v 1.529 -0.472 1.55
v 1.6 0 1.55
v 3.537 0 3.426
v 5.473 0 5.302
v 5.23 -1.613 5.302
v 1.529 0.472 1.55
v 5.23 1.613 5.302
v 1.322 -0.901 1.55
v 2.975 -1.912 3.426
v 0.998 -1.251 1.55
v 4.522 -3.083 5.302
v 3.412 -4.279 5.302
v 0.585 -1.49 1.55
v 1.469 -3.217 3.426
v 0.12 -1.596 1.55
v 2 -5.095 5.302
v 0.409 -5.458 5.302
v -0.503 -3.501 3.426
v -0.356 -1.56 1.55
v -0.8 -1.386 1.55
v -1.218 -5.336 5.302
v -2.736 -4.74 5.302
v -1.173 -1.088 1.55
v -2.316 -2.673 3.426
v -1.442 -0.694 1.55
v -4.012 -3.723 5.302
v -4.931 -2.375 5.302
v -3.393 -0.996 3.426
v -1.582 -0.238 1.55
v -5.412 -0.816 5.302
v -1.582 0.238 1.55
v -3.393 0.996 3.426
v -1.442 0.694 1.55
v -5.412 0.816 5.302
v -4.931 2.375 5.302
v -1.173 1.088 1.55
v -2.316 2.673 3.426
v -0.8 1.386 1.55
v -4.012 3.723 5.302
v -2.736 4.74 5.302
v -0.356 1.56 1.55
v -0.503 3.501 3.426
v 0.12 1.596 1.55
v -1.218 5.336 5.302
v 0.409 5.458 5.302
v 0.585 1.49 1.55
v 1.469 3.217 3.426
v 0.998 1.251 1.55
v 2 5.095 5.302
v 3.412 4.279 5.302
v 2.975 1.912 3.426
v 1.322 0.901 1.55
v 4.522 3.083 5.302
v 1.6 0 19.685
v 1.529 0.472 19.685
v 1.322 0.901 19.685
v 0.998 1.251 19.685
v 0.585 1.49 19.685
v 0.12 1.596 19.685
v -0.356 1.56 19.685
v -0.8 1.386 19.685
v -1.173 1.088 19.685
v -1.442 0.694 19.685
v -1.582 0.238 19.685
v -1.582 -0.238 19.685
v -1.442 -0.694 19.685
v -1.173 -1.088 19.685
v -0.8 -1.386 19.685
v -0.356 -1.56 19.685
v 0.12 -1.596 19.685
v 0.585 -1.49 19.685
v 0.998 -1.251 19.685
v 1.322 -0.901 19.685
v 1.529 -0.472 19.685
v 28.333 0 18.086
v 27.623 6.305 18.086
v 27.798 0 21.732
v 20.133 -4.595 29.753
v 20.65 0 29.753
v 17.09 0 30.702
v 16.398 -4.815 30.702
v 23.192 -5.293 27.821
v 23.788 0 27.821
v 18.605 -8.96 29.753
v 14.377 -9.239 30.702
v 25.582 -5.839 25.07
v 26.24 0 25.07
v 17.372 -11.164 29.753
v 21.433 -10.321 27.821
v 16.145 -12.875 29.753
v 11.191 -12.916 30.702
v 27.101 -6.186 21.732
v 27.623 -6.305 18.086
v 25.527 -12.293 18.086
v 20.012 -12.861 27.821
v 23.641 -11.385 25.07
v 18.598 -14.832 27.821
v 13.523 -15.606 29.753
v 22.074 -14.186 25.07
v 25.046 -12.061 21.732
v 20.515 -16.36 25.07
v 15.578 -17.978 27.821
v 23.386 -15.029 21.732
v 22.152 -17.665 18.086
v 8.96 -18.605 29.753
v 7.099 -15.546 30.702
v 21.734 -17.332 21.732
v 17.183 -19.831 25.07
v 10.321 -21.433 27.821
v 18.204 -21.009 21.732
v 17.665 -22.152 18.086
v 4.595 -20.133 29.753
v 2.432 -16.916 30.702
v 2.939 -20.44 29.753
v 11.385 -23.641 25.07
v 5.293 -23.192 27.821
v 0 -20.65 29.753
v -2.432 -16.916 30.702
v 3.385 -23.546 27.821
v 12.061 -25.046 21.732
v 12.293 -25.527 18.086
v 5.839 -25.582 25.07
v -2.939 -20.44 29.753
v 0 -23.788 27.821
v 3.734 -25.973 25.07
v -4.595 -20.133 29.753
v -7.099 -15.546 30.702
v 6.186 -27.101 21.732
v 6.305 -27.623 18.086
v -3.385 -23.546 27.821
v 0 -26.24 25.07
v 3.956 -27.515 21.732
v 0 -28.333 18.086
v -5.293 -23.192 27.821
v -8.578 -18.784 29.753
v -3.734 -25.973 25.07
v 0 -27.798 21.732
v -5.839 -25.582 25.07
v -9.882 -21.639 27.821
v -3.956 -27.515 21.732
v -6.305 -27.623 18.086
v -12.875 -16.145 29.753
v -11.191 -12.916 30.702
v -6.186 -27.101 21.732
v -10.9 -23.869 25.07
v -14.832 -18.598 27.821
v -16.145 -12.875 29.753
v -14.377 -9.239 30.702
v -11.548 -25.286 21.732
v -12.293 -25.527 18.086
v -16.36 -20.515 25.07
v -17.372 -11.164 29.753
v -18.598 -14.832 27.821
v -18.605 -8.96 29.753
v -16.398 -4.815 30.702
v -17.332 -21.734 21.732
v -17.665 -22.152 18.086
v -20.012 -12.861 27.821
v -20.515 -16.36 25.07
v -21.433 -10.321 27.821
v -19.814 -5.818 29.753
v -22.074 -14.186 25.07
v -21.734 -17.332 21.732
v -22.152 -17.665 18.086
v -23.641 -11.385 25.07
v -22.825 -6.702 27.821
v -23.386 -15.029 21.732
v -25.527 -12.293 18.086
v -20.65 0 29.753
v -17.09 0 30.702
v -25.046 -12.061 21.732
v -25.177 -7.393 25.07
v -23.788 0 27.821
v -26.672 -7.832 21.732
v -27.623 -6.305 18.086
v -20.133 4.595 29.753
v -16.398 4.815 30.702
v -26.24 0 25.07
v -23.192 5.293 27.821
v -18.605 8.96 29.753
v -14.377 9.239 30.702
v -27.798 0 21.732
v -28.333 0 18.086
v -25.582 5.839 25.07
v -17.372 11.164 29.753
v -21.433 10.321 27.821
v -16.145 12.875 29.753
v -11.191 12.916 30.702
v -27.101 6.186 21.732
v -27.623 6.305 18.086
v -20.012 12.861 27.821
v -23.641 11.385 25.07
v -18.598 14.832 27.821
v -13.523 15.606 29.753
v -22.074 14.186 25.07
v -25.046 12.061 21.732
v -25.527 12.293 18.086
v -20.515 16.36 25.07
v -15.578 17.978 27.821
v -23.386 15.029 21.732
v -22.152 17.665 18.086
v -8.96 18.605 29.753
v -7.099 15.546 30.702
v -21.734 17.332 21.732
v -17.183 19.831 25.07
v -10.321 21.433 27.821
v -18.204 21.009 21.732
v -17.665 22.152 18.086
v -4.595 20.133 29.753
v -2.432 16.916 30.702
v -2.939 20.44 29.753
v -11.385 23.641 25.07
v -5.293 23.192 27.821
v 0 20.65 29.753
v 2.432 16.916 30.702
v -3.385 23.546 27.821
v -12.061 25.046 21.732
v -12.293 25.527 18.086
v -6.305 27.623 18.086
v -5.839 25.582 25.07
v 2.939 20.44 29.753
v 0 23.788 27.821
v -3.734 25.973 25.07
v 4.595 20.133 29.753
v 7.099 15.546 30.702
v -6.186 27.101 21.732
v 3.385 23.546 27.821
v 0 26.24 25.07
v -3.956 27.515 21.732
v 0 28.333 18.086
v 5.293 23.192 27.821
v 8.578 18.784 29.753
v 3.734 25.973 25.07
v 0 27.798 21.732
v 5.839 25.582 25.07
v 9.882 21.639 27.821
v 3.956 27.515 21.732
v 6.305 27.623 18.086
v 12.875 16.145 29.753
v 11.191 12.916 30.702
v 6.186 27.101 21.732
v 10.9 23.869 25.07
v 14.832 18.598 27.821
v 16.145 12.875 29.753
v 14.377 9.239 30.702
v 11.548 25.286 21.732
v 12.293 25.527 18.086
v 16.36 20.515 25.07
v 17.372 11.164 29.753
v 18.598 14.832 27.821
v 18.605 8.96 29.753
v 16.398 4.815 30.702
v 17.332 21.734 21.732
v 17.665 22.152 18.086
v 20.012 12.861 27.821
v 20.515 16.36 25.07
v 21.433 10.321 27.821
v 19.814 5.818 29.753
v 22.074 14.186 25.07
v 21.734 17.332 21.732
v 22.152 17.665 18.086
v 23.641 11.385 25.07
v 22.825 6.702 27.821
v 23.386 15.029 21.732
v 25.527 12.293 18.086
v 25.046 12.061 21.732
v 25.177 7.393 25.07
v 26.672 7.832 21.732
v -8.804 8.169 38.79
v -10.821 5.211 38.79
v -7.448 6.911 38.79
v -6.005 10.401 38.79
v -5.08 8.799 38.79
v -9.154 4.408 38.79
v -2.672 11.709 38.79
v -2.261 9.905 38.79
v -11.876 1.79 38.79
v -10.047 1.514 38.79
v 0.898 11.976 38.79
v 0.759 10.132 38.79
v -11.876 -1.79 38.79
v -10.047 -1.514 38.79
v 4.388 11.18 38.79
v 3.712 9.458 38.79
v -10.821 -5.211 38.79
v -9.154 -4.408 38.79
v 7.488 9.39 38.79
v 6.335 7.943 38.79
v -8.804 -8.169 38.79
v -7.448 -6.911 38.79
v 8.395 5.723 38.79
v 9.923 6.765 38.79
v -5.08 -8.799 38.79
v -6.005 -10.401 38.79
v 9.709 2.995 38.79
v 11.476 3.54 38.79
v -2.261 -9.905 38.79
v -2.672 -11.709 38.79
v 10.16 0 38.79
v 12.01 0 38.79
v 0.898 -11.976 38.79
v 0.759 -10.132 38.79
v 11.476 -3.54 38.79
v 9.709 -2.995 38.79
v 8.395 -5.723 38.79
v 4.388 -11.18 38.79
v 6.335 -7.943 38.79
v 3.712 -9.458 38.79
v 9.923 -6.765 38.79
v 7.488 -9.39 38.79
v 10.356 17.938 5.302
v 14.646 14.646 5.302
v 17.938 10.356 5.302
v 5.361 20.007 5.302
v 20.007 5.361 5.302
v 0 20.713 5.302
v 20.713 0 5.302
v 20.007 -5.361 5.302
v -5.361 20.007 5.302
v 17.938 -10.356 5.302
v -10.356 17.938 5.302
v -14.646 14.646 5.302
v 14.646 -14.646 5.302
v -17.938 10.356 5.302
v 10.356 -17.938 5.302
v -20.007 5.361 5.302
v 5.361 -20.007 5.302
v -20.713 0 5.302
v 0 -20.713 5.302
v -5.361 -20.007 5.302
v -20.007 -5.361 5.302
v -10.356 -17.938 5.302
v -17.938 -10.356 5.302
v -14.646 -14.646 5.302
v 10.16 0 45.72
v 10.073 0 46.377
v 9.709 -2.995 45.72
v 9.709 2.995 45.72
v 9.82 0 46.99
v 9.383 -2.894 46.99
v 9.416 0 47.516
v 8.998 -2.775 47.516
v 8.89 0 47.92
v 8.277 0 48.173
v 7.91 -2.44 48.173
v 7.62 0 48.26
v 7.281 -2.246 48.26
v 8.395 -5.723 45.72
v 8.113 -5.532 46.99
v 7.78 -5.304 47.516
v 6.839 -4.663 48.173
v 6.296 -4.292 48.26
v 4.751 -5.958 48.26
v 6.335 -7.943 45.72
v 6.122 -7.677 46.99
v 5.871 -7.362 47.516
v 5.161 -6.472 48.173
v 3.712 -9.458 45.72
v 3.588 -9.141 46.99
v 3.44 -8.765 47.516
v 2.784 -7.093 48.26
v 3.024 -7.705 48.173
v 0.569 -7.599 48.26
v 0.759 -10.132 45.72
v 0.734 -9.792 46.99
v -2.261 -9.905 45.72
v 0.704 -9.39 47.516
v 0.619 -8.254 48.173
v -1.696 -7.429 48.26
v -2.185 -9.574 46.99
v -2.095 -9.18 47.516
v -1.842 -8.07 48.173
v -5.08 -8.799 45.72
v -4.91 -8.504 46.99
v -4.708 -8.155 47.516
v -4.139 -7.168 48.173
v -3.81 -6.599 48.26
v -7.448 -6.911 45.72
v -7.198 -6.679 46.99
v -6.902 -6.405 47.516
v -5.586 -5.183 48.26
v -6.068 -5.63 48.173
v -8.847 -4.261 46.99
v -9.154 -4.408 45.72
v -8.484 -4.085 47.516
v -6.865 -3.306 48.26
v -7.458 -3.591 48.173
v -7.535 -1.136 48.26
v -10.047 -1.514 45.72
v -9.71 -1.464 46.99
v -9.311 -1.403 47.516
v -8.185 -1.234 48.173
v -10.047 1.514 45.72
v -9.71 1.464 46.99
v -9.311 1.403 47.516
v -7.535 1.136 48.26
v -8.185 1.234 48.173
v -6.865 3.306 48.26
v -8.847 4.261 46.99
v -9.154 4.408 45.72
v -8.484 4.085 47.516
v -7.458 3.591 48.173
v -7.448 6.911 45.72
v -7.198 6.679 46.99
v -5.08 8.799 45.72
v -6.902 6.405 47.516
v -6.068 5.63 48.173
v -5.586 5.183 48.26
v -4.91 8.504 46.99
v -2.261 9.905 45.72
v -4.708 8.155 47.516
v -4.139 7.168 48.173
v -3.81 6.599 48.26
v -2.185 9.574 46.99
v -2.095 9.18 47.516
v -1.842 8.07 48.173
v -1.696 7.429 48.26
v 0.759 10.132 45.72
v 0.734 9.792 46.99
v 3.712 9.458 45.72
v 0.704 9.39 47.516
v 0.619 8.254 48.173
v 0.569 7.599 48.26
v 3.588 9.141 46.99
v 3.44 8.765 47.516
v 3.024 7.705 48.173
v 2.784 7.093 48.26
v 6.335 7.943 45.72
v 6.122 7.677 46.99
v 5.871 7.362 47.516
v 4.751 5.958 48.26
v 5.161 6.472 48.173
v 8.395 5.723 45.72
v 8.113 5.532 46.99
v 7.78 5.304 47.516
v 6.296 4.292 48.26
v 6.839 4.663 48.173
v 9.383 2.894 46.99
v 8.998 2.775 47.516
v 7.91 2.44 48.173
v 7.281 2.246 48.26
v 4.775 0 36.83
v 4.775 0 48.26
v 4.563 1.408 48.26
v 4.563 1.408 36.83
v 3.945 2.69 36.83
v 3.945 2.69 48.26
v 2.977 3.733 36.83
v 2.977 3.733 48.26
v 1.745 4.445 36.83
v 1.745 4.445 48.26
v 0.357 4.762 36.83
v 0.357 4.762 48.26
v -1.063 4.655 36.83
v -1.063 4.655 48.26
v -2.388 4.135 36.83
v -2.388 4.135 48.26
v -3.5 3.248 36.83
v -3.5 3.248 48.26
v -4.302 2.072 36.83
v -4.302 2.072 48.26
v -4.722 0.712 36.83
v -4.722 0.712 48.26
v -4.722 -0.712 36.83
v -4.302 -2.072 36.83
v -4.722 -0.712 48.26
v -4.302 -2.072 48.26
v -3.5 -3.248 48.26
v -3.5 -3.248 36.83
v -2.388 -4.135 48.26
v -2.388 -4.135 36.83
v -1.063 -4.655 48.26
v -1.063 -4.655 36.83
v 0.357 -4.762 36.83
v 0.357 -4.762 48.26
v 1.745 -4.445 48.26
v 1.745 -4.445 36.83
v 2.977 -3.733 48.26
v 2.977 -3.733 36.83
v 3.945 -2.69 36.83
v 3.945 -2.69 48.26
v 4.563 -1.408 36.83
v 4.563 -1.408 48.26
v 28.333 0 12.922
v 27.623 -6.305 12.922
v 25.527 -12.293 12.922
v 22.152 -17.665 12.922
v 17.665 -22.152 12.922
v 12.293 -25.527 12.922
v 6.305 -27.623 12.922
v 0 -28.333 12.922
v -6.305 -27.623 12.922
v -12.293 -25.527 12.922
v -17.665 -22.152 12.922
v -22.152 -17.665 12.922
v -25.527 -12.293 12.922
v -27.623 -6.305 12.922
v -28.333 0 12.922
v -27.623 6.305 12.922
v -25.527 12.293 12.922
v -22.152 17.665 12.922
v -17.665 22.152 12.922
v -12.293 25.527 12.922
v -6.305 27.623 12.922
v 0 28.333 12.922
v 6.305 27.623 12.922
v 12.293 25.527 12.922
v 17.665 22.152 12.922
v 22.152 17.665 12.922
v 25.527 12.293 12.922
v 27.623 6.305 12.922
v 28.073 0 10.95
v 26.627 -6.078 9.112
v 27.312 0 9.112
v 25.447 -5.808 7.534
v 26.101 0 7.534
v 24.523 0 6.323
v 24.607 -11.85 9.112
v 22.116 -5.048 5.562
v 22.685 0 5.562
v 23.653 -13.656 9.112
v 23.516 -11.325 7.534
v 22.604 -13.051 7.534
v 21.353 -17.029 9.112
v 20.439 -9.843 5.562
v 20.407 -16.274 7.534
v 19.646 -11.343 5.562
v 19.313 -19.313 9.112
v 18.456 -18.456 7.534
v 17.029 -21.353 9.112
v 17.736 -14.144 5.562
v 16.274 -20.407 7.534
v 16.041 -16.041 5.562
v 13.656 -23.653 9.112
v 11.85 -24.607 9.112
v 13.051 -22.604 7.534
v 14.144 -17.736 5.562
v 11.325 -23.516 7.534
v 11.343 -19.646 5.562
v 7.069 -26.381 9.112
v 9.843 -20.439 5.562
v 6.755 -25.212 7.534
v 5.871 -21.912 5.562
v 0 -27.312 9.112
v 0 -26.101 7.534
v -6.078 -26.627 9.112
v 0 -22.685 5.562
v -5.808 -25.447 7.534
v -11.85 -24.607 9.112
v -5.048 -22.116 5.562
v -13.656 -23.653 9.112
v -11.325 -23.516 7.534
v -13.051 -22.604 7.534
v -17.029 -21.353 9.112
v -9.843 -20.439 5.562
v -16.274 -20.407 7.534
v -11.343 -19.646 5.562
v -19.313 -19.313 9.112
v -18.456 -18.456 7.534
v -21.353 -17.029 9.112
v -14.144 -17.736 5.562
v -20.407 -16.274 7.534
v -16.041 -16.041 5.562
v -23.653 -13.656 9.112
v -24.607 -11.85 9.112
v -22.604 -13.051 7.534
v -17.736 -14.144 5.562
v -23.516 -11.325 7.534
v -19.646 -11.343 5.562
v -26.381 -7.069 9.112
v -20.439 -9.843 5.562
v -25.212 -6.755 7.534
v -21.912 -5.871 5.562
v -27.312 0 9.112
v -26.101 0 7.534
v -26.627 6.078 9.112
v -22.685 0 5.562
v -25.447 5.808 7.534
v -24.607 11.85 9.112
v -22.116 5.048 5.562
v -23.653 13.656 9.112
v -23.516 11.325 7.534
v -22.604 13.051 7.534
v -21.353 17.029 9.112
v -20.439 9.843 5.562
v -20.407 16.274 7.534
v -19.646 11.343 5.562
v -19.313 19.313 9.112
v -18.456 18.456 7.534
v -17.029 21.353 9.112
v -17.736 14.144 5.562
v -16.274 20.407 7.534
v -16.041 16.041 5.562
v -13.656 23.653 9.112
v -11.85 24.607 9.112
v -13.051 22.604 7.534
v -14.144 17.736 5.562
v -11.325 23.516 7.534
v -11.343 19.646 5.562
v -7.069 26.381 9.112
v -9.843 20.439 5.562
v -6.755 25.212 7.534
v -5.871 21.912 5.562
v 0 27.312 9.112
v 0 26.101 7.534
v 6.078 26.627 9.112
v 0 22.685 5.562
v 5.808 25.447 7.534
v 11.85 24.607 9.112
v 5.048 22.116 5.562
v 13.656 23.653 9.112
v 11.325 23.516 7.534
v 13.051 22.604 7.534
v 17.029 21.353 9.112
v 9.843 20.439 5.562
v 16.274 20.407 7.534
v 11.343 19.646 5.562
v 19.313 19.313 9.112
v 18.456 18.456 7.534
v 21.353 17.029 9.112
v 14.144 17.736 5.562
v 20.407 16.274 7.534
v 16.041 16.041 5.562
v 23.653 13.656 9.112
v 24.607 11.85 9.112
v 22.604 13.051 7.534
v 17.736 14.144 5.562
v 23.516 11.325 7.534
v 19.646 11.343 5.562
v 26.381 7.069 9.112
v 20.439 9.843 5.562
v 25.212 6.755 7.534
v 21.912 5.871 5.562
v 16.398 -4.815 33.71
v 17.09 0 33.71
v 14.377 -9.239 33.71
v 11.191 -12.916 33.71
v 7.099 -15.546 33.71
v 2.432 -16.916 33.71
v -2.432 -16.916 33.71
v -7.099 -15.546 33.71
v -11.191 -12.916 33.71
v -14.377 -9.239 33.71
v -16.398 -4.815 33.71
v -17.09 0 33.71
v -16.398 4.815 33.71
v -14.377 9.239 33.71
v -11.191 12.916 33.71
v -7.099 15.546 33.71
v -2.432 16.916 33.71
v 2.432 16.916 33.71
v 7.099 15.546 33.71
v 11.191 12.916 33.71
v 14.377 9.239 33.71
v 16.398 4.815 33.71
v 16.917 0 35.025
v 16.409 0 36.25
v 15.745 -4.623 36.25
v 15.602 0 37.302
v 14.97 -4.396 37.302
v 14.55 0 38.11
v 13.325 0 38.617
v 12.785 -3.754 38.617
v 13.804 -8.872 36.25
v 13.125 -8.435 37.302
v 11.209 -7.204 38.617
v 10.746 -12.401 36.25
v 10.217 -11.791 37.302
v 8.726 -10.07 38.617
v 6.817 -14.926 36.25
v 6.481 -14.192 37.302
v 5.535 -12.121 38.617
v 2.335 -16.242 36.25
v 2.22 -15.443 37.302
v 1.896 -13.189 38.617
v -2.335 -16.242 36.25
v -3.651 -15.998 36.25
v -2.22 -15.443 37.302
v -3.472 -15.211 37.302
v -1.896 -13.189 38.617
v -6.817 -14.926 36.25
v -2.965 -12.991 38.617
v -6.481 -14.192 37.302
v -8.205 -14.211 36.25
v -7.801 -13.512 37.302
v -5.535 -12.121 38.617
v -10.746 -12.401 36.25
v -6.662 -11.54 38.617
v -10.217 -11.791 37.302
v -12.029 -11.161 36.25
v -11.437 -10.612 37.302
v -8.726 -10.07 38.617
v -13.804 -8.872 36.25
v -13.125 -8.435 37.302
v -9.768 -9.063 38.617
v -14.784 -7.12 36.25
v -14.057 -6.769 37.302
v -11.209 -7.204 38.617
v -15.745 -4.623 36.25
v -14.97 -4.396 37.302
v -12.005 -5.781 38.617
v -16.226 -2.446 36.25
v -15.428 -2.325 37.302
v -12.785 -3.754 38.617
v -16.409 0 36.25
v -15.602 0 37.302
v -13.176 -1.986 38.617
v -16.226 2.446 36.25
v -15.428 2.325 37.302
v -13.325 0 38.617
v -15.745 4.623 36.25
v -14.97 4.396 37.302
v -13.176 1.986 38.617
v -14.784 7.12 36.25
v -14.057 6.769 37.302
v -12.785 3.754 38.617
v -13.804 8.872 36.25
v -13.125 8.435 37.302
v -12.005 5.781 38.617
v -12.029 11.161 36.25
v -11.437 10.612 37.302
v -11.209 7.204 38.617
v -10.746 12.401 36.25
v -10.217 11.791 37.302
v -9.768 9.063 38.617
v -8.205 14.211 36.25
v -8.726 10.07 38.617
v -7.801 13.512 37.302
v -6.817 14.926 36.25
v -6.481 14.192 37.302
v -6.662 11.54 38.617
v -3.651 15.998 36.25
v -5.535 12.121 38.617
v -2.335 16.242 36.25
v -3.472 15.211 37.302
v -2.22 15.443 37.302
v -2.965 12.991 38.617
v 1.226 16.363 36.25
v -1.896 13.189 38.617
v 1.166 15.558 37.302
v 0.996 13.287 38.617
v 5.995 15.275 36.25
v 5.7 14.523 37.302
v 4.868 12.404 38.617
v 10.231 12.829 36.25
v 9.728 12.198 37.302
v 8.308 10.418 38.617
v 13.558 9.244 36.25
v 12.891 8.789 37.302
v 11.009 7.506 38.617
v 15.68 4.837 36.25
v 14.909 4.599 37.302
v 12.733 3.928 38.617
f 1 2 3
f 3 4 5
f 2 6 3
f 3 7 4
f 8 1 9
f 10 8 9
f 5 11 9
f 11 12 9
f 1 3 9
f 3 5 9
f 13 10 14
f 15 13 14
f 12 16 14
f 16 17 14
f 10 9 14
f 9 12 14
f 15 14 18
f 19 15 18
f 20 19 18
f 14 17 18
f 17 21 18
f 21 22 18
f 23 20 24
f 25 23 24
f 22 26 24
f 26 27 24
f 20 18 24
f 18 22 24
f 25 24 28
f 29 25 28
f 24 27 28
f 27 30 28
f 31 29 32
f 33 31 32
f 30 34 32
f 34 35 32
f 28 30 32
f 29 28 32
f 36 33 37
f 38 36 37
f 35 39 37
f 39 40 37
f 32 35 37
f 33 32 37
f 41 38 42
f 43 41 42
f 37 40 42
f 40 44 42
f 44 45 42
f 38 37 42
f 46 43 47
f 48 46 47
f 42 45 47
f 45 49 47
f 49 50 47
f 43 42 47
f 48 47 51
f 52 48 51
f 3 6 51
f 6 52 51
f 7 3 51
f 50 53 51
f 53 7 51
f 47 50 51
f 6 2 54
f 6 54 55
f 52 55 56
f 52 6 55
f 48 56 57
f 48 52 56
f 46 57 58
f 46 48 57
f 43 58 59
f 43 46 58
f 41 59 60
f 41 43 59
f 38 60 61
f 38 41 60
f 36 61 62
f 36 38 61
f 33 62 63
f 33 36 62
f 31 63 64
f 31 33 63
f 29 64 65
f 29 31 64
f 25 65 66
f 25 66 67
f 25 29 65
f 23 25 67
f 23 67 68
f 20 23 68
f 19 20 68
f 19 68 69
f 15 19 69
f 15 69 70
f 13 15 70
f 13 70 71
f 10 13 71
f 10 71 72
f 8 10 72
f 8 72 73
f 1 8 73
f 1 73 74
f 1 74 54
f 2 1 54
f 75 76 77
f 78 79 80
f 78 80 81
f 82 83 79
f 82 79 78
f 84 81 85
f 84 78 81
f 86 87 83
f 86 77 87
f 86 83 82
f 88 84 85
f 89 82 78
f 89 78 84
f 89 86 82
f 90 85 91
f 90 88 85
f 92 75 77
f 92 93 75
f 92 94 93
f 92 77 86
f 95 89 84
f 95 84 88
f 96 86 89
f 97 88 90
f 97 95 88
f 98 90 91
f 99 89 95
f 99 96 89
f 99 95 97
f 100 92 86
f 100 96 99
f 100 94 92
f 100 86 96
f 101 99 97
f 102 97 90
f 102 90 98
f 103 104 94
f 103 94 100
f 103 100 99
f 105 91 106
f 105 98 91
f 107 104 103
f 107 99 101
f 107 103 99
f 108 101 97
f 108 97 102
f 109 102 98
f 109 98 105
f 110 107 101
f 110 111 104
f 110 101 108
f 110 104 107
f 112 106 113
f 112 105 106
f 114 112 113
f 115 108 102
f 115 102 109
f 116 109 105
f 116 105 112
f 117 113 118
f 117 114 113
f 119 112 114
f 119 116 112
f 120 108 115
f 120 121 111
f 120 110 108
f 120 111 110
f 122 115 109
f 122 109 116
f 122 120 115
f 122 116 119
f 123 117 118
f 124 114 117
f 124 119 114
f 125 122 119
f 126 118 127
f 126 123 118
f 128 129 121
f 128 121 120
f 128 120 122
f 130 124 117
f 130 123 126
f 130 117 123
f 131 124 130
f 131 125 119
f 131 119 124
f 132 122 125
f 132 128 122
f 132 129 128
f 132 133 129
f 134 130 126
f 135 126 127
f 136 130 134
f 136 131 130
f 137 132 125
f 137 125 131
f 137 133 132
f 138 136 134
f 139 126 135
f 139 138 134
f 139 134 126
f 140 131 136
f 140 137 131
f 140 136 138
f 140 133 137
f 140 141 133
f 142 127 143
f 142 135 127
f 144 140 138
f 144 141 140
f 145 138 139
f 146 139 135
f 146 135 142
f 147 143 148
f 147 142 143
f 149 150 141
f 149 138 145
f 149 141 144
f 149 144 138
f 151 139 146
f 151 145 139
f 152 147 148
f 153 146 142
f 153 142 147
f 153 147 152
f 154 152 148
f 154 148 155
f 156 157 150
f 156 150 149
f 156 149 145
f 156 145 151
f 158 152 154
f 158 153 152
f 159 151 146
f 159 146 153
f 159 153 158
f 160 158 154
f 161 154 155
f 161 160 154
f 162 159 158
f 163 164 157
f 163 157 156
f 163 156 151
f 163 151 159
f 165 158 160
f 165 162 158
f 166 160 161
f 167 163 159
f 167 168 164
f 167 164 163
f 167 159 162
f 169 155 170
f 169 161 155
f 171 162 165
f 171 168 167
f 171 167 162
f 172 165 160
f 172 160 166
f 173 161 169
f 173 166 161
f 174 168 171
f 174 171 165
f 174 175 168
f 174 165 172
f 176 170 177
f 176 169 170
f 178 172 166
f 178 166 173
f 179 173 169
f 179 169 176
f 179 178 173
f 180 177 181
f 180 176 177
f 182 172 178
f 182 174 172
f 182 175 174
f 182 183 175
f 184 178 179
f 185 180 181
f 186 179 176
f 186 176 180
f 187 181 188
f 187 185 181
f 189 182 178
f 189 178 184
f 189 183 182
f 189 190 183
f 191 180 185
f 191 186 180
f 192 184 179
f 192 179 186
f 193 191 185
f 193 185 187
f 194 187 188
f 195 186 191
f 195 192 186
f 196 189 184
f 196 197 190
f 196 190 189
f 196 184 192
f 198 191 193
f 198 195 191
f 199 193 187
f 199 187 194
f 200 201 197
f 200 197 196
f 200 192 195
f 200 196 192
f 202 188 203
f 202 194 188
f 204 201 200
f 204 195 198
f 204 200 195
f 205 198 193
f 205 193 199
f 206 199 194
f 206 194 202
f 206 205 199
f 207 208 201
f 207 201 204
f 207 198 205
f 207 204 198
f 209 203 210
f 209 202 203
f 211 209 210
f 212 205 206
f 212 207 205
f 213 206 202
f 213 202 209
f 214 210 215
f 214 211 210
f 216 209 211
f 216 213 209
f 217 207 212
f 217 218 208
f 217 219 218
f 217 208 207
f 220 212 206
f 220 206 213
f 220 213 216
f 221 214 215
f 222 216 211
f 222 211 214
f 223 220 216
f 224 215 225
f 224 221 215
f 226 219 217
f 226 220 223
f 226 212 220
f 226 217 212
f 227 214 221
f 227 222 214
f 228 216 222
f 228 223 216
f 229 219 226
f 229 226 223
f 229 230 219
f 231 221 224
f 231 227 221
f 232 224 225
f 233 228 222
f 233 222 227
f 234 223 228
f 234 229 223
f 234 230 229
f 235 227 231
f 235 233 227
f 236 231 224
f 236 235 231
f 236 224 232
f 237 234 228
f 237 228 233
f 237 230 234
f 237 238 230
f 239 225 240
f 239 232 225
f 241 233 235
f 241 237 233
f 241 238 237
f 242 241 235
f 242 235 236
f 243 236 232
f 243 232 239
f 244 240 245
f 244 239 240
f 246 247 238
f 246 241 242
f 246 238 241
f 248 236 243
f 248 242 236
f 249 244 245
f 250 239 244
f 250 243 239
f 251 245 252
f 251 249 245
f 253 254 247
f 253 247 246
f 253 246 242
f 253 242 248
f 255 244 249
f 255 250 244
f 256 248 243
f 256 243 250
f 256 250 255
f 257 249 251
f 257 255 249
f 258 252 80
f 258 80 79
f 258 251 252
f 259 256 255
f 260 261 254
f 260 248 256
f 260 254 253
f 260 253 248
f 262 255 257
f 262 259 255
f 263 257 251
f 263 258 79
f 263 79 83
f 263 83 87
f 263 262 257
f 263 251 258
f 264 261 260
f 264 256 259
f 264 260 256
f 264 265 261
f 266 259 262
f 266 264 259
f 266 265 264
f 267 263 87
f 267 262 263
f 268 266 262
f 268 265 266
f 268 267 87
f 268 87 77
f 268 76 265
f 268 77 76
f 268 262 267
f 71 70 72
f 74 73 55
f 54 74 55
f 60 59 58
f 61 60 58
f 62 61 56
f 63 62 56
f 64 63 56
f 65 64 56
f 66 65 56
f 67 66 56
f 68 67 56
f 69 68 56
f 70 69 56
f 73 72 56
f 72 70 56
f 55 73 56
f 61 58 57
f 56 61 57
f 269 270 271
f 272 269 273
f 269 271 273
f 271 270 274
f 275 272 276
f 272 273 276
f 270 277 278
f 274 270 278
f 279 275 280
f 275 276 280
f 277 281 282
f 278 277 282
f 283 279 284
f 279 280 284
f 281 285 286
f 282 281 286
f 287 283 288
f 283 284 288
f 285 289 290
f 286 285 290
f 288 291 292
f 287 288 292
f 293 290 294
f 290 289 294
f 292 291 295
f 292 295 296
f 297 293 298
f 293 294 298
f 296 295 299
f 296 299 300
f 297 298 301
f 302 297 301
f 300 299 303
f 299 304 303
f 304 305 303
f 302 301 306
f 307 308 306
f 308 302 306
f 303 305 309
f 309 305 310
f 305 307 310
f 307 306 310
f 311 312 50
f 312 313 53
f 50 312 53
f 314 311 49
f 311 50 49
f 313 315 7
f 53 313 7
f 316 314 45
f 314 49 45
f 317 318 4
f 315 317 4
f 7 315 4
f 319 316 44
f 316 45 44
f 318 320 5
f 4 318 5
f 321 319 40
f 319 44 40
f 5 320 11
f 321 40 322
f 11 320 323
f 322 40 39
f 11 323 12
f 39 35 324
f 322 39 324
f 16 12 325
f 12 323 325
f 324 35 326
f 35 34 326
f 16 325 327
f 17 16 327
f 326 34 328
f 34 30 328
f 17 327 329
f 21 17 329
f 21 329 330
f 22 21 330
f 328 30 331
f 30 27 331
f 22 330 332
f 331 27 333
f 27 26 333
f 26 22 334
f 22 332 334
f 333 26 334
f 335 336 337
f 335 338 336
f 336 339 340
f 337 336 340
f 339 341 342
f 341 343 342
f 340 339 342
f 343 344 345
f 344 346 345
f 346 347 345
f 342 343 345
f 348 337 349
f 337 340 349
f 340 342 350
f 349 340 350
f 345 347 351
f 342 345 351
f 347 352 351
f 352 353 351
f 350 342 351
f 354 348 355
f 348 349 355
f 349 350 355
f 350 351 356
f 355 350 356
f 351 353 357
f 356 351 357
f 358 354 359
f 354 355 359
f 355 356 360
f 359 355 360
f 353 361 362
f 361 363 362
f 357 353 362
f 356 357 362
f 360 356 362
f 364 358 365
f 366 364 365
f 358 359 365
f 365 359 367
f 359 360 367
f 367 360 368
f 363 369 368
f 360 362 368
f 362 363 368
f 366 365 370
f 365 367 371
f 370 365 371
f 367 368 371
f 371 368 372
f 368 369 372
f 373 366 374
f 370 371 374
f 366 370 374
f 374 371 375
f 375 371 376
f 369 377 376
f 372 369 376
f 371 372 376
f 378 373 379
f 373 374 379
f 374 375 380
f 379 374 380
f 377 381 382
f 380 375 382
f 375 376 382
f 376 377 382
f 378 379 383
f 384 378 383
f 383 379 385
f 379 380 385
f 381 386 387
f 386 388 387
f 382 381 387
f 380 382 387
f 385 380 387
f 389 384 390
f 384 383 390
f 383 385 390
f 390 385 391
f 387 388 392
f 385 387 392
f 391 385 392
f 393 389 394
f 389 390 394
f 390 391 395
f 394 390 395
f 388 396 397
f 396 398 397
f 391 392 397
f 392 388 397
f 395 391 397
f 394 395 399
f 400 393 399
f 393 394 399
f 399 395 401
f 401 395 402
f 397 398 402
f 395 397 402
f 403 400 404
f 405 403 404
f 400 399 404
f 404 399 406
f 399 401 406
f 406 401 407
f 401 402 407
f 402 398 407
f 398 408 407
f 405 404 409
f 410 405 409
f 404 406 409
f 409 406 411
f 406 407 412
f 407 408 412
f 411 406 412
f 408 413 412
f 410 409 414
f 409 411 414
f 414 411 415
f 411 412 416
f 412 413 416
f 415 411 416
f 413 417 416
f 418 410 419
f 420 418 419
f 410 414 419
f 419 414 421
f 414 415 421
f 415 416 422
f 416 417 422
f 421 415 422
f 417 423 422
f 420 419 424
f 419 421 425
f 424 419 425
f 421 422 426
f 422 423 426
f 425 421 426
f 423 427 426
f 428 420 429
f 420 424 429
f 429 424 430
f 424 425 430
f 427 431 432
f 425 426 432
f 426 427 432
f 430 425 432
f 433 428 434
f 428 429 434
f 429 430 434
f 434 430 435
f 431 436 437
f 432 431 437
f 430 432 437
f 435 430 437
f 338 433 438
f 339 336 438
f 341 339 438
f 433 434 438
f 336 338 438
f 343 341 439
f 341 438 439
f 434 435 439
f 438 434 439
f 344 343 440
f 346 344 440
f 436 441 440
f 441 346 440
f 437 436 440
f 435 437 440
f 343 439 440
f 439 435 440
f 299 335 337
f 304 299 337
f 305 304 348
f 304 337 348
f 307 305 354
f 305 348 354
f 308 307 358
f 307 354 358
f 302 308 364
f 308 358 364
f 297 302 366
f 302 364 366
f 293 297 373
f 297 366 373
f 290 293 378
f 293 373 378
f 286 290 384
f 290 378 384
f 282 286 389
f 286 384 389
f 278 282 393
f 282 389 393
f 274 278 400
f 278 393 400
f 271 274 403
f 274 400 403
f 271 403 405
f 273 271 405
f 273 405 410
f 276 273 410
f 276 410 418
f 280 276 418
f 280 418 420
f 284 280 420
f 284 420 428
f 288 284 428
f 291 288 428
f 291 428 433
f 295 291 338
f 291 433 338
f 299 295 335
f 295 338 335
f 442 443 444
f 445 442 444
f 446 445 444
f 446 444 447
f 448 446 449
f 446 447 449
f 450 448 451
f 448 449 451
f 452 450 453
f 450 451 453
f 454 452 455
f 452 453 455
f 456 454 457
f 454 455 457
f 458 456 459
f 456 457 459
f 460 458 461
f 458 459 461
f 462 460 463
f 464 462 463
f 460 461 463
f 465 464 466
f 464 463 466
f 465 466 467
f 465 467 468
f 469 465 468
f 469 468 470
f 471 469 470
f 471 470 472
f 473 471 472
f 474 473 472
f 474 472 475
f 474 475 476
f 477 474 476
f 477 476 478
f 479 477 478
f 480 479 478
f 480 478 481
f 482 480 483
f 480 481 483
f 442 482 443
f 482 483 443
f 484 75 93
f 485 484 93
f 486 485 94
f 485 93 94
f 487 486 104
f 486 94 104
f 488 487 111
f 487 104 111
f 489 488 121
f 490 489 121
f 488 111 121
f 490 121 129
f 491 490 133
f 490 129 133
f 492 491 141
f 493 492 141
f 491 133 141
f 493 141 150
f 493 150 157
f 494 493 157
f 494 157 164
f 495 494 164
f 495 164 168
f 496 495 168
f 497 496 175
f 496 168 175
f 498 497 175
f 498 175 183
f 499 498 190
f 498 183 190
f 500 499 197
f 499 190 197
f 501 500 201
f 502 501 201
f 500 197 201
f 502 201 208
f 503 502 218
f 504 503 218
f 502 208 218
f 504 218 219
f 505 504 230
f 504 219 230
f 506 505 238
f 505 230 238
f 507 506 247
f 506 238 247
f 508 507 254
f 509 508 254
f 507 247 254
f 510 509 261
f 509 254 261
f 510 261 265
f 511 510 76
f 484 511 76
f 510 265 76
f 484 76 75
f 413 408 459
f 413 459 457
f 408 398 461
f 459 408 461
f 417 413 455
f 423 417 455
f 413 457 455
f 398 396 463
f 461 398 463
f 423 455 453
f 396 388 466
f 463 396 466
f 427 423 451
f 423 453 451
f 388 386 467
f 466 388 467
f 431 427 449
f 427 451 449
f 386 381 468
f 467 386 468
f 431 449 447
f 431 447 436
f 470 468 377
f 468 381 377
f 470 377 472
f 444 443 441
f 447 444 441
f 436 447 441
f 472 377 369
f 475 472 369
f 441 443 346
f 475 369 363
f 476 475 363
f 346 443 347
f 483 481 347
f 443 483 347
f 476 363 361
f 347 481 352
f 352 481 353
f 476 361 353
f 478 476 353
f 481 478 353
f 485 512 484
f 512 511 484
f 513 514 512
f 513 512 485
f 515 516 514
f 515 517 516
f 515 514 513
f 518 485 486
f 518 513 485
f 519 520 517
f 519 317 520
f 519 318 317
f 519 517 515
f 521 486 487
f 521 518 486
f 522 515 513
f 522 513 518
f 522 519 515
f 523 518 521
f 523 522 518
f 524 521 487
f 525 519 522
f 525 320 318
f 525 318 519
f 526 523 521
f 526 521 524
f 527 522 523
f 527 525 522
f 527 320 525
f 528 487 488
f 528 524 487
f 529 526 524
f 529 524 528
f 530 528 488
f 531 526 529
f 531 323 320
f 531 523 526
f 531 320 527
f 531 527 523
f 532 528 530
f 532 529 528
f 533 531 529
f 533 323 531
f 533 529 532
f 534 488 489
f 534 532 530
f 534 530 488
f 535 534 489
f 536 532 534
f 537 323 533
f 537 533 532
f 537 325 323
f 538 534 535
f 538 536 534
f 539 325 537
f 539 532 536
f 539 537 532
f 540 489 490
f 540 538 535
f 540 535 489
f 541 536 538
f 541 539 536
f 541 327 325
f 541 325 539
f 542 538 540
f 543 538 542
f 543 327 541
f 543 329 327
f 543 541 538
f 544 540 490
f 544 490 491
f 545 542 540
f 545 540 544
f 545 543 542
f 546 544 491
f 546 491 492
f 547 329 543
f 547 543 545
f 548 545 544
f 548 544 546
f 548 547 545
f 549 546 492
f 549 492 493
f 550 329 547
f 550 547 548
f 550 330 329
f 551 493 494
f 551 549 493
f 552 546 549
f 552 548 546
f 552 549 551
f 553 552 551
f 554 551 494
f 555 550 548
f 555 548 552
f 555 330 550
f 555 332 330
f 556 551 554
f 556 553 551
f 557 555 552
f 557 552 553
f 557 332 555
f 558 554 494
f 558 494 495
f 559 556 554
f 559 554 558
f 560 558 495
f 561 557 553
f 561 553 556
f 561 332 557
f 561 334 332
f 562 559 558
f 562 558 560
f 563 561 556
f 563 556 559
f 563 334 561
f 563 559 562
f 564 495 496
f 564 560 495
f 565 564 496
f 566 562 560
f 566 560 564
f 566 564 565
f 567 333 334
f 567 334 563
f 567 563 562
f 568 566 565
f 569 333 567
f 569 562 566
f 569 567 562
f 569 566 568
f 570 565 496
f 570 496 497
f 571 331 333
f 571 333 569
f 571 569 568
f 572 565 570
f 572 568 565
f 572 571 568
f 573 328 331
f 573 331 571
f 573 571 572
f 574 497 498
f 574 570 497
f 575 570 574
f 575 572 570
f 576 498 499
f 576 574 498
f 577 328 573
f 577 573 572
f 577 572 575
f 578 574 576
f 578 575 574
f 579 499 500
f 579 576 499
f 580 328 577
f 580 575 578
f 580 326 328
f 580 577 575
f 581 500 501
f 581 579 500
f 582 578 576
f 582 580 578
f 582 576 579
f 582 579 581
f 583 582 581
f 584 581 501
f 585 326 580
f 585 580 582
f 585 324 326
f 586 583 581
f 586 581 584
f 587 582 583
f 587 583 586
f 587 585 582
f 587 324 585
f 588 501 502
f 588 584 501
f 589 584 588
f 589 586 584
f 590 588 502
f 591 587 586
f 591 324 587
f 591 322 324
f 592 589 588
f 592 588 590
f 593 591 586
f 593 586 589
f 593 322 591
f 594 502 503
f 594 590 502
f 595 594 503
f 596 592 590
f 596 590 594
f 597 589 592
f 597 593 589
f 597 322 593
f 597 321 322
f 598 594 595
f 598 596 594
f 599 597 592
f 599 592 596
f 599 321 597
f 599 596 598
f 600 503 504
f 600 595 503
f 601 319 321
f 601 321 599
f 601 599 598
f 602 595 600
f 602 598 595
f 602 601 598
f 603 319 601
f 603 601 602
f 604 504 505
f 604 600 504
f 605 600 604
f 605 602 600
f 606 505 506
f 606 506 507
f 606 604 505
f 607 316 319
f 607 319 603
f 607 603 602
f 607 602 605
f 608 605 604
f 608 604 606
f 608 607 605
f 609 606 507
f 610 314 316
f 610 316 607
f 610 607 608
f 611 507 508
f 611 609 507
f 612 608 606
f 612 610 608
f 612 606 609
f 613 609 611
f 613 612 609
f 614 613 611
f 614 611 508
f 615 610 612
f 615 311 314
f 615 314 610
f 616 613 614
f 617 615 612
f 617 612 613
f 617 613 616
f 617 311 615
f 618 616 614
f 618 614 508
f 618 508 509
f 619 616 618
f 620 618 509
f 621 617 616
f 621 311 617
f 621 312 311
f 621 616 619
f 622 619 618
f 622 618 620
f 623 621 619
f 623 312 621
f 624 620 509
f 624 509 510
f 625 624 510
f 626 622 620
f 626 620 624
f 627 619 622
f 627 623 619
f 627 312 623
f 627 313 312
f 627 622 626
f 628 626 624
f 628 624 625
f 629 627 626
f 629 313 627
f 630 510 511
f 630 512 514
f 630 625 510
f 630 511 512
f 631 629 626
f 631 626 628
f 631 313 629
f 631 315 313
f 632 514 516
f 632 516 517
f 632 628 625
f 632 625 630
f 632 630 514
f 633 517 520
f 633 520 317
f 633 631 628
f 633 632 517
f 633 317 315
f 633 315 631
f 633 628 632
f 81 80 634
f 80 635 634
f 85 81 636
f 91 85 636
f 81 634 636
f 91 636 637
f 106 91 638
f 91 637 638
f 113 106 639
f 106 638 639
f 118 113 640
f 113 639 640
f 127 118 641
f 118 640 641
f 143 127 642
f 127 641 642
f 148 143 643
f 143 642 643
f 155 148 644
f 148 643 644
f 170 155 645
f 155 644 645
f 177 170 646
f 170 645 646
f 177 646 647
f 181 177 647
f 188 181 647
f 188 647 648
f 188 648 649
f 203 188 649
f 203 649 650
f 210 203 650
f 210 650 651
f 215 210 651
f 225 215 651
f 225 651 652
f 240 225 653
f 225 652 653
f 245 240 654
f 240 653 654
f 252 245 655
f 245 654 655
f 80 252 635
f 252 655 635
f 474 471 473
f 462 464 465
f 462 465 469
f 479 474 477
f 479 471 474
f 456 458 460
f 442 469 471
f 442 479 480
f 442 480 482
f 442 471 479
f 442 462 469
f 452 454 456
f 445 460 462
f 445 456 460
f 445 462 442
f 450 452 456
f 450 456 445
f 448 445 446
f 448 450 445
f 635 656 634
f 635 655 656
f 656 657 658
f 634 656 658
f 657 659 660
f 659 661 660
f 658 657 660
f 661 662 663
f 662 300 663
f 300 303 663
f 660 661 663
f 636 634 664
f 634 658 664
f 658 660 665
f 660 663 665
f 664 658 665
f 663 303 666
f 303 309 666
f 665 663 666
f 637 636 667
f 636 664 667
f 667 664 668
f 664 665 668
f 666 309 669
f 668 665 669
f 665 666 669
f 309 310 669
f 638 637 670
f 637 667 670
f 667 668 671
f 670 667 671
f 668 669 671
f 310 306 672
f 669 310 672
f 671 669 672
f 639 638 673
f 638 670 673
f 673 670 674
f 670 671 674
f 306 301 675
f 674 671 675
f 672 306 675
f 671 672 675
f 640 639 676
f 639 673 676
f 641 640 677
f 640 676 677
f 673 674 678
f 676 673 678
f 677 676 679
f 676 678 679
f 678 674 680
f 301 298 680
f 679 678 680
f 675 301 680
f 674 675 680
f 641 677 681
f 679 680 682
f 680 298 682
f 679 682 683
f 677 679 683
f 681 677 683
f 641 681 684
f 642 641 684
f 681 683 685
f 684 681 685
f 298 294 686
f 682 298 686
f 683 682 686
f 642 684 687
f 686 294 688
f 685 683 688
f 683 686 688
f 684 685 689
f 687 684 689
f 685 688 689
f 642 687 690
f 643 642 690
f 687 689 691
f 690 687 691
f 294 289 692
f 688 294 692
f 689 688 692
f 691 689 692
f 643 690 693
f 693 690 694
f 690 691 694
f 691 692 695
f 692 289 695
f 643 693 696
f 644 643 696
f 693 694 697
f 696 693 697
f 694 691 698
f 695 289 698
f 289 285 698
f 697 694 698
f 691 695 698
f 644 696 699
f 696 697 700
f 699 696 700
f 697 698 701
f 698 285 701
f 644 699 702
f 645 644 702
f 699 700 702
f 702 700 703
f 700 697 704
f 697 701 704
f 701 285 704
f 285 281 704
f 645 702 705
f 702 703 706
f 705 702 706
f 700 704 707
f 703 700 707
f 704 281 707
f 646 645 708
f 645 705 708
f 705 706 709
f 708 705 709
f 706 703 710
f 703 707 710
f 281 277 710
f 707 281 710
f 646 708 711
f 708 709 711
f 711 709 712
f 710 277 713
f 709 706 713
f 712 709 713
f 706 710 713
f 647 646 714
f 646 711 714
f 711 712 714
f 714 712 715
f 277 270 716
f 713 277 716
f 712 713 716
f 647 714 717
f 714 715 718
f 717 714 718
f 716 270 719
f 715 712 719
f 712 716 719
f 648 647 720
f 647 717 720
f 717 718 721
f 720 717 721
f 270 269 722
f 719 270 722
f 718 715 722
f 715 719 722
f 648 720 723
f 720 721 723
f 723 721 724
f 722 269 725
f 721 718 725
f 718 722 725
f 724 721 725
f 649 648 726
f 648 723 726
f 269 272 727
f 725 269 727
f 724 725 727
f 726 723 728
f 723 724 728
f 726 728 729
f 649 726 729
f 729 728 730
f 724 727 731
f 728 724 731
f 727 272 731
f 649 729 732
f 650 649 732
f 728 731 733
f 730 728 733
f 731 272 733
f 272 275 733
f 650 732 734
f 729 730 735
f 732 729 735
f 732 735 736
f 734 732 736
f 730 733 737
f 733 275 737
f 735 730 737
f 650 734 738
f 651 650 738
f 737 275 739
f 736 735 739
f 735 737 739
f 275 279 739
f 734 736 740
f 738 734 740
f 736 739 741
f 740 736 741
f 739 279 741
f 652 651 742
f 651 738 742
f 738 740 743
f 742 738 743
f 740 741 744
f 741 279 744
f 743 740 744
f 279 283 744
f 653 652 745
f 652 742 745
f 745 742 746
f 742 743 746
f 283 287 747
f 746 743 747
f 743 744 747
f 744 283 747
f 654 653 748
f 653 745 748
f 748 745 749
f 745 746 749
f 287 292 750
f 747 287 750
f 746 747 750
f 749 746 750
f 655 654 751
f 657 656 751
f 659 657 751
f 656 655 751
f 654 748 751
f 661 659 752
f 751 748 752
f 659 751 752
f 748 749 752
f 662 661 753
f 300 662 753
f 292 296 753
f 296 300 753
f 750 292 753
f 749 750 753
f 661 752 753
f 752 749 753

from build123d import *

# Parameters (mm, degrees)
F2_R     = 5.08
F4_R     = 7.62
F5_R     = 2.54
F6_R     = 4.7752
F7_DEPTH = 11.43
F8_R     = 1.6002
F9_DEPTH = 19.685


# Not quite as in the source:
# - a fillet or chamfer that OpenCascade refuses, or shapes differently, is made with other operations: its cross-section is extruded or revolved along the edge and cut away or added


with BuildPart() as f1:
    # F0 (on Front) → F1 (revolve)
    with BuildSketch(Plane.XZ):
        Polygon((0, 48.26), (0, 0), (5.4729898483, 5.3019602149), (28.3329898483, 5.3019602149), (28.3329898483, 30.7019602149), (17.0898887448, 30.7019602149), (17.0898887448, 38.7901112552), (10.16, 38.7901112552), (10.16, 48.26), align=None)
    revolve(axis=Axis((0, 0, 24.13), (0, 0, -1)))

    # F2
    f2_edges = [f1.edges().sort_by_distance(p)[0] for p in [
        (-17.089889, 0, 38.790111),
    ]]
    fillet(f2_edges, radius=F2_R)

    # F3: fillet of radius 12.7 on 1 edges, made by hand

    # F3_s1 → F3_t2 (revolve, cut)
    with BuildSketch(Plane.XZ):
        with BuildLine():
            ThreePointArc((17.0898887448, 30.7019602149), (25.1143562052, 26.5352808999), (28.3329898483, 18.085802099))
            Line((28.3329898483, 18.085802099), (28.3329898483, 30.7019602149))
            Line((28.3329898483, 30.7019602149), (17.0898887448, 30.7019602149))
        make_face()
    revolve(axis=Axis((0, 0, 30.7019602149), (0, 0, -1)), mode=Mode.SUBTRACT)

    # F4
    f4_edges = [f1.edges().sort_by_distance(p)[0] for p in [
        (-28.33299, 0, 5.30196),
    ]]
    fillet(f4_edges, radius=F4_R)

    # F5
    f5_edges = [f1.edges().sort_by_distance(p)[0] for p in [
        (-10.16, 0, 48.26),
    ]]
    fillet(f5_edges, radius=F5_R)

    # F6 (on face) → F7 (cut)
    with BuildSketch(Plane.XY.offset(48.26)):
        Circle(F6_R)
    extrude(amount=-F7_DEPTH, mode=Mode.SUBTRACT)

    # F8 (on Top) → F9 (cut)
    with BuildSketch(Plane.XY):
        Circle(F8_R)
    extrude(amount=F9_DEPTH, mode=Mode.SUBTRACT)


solid = f1.part
